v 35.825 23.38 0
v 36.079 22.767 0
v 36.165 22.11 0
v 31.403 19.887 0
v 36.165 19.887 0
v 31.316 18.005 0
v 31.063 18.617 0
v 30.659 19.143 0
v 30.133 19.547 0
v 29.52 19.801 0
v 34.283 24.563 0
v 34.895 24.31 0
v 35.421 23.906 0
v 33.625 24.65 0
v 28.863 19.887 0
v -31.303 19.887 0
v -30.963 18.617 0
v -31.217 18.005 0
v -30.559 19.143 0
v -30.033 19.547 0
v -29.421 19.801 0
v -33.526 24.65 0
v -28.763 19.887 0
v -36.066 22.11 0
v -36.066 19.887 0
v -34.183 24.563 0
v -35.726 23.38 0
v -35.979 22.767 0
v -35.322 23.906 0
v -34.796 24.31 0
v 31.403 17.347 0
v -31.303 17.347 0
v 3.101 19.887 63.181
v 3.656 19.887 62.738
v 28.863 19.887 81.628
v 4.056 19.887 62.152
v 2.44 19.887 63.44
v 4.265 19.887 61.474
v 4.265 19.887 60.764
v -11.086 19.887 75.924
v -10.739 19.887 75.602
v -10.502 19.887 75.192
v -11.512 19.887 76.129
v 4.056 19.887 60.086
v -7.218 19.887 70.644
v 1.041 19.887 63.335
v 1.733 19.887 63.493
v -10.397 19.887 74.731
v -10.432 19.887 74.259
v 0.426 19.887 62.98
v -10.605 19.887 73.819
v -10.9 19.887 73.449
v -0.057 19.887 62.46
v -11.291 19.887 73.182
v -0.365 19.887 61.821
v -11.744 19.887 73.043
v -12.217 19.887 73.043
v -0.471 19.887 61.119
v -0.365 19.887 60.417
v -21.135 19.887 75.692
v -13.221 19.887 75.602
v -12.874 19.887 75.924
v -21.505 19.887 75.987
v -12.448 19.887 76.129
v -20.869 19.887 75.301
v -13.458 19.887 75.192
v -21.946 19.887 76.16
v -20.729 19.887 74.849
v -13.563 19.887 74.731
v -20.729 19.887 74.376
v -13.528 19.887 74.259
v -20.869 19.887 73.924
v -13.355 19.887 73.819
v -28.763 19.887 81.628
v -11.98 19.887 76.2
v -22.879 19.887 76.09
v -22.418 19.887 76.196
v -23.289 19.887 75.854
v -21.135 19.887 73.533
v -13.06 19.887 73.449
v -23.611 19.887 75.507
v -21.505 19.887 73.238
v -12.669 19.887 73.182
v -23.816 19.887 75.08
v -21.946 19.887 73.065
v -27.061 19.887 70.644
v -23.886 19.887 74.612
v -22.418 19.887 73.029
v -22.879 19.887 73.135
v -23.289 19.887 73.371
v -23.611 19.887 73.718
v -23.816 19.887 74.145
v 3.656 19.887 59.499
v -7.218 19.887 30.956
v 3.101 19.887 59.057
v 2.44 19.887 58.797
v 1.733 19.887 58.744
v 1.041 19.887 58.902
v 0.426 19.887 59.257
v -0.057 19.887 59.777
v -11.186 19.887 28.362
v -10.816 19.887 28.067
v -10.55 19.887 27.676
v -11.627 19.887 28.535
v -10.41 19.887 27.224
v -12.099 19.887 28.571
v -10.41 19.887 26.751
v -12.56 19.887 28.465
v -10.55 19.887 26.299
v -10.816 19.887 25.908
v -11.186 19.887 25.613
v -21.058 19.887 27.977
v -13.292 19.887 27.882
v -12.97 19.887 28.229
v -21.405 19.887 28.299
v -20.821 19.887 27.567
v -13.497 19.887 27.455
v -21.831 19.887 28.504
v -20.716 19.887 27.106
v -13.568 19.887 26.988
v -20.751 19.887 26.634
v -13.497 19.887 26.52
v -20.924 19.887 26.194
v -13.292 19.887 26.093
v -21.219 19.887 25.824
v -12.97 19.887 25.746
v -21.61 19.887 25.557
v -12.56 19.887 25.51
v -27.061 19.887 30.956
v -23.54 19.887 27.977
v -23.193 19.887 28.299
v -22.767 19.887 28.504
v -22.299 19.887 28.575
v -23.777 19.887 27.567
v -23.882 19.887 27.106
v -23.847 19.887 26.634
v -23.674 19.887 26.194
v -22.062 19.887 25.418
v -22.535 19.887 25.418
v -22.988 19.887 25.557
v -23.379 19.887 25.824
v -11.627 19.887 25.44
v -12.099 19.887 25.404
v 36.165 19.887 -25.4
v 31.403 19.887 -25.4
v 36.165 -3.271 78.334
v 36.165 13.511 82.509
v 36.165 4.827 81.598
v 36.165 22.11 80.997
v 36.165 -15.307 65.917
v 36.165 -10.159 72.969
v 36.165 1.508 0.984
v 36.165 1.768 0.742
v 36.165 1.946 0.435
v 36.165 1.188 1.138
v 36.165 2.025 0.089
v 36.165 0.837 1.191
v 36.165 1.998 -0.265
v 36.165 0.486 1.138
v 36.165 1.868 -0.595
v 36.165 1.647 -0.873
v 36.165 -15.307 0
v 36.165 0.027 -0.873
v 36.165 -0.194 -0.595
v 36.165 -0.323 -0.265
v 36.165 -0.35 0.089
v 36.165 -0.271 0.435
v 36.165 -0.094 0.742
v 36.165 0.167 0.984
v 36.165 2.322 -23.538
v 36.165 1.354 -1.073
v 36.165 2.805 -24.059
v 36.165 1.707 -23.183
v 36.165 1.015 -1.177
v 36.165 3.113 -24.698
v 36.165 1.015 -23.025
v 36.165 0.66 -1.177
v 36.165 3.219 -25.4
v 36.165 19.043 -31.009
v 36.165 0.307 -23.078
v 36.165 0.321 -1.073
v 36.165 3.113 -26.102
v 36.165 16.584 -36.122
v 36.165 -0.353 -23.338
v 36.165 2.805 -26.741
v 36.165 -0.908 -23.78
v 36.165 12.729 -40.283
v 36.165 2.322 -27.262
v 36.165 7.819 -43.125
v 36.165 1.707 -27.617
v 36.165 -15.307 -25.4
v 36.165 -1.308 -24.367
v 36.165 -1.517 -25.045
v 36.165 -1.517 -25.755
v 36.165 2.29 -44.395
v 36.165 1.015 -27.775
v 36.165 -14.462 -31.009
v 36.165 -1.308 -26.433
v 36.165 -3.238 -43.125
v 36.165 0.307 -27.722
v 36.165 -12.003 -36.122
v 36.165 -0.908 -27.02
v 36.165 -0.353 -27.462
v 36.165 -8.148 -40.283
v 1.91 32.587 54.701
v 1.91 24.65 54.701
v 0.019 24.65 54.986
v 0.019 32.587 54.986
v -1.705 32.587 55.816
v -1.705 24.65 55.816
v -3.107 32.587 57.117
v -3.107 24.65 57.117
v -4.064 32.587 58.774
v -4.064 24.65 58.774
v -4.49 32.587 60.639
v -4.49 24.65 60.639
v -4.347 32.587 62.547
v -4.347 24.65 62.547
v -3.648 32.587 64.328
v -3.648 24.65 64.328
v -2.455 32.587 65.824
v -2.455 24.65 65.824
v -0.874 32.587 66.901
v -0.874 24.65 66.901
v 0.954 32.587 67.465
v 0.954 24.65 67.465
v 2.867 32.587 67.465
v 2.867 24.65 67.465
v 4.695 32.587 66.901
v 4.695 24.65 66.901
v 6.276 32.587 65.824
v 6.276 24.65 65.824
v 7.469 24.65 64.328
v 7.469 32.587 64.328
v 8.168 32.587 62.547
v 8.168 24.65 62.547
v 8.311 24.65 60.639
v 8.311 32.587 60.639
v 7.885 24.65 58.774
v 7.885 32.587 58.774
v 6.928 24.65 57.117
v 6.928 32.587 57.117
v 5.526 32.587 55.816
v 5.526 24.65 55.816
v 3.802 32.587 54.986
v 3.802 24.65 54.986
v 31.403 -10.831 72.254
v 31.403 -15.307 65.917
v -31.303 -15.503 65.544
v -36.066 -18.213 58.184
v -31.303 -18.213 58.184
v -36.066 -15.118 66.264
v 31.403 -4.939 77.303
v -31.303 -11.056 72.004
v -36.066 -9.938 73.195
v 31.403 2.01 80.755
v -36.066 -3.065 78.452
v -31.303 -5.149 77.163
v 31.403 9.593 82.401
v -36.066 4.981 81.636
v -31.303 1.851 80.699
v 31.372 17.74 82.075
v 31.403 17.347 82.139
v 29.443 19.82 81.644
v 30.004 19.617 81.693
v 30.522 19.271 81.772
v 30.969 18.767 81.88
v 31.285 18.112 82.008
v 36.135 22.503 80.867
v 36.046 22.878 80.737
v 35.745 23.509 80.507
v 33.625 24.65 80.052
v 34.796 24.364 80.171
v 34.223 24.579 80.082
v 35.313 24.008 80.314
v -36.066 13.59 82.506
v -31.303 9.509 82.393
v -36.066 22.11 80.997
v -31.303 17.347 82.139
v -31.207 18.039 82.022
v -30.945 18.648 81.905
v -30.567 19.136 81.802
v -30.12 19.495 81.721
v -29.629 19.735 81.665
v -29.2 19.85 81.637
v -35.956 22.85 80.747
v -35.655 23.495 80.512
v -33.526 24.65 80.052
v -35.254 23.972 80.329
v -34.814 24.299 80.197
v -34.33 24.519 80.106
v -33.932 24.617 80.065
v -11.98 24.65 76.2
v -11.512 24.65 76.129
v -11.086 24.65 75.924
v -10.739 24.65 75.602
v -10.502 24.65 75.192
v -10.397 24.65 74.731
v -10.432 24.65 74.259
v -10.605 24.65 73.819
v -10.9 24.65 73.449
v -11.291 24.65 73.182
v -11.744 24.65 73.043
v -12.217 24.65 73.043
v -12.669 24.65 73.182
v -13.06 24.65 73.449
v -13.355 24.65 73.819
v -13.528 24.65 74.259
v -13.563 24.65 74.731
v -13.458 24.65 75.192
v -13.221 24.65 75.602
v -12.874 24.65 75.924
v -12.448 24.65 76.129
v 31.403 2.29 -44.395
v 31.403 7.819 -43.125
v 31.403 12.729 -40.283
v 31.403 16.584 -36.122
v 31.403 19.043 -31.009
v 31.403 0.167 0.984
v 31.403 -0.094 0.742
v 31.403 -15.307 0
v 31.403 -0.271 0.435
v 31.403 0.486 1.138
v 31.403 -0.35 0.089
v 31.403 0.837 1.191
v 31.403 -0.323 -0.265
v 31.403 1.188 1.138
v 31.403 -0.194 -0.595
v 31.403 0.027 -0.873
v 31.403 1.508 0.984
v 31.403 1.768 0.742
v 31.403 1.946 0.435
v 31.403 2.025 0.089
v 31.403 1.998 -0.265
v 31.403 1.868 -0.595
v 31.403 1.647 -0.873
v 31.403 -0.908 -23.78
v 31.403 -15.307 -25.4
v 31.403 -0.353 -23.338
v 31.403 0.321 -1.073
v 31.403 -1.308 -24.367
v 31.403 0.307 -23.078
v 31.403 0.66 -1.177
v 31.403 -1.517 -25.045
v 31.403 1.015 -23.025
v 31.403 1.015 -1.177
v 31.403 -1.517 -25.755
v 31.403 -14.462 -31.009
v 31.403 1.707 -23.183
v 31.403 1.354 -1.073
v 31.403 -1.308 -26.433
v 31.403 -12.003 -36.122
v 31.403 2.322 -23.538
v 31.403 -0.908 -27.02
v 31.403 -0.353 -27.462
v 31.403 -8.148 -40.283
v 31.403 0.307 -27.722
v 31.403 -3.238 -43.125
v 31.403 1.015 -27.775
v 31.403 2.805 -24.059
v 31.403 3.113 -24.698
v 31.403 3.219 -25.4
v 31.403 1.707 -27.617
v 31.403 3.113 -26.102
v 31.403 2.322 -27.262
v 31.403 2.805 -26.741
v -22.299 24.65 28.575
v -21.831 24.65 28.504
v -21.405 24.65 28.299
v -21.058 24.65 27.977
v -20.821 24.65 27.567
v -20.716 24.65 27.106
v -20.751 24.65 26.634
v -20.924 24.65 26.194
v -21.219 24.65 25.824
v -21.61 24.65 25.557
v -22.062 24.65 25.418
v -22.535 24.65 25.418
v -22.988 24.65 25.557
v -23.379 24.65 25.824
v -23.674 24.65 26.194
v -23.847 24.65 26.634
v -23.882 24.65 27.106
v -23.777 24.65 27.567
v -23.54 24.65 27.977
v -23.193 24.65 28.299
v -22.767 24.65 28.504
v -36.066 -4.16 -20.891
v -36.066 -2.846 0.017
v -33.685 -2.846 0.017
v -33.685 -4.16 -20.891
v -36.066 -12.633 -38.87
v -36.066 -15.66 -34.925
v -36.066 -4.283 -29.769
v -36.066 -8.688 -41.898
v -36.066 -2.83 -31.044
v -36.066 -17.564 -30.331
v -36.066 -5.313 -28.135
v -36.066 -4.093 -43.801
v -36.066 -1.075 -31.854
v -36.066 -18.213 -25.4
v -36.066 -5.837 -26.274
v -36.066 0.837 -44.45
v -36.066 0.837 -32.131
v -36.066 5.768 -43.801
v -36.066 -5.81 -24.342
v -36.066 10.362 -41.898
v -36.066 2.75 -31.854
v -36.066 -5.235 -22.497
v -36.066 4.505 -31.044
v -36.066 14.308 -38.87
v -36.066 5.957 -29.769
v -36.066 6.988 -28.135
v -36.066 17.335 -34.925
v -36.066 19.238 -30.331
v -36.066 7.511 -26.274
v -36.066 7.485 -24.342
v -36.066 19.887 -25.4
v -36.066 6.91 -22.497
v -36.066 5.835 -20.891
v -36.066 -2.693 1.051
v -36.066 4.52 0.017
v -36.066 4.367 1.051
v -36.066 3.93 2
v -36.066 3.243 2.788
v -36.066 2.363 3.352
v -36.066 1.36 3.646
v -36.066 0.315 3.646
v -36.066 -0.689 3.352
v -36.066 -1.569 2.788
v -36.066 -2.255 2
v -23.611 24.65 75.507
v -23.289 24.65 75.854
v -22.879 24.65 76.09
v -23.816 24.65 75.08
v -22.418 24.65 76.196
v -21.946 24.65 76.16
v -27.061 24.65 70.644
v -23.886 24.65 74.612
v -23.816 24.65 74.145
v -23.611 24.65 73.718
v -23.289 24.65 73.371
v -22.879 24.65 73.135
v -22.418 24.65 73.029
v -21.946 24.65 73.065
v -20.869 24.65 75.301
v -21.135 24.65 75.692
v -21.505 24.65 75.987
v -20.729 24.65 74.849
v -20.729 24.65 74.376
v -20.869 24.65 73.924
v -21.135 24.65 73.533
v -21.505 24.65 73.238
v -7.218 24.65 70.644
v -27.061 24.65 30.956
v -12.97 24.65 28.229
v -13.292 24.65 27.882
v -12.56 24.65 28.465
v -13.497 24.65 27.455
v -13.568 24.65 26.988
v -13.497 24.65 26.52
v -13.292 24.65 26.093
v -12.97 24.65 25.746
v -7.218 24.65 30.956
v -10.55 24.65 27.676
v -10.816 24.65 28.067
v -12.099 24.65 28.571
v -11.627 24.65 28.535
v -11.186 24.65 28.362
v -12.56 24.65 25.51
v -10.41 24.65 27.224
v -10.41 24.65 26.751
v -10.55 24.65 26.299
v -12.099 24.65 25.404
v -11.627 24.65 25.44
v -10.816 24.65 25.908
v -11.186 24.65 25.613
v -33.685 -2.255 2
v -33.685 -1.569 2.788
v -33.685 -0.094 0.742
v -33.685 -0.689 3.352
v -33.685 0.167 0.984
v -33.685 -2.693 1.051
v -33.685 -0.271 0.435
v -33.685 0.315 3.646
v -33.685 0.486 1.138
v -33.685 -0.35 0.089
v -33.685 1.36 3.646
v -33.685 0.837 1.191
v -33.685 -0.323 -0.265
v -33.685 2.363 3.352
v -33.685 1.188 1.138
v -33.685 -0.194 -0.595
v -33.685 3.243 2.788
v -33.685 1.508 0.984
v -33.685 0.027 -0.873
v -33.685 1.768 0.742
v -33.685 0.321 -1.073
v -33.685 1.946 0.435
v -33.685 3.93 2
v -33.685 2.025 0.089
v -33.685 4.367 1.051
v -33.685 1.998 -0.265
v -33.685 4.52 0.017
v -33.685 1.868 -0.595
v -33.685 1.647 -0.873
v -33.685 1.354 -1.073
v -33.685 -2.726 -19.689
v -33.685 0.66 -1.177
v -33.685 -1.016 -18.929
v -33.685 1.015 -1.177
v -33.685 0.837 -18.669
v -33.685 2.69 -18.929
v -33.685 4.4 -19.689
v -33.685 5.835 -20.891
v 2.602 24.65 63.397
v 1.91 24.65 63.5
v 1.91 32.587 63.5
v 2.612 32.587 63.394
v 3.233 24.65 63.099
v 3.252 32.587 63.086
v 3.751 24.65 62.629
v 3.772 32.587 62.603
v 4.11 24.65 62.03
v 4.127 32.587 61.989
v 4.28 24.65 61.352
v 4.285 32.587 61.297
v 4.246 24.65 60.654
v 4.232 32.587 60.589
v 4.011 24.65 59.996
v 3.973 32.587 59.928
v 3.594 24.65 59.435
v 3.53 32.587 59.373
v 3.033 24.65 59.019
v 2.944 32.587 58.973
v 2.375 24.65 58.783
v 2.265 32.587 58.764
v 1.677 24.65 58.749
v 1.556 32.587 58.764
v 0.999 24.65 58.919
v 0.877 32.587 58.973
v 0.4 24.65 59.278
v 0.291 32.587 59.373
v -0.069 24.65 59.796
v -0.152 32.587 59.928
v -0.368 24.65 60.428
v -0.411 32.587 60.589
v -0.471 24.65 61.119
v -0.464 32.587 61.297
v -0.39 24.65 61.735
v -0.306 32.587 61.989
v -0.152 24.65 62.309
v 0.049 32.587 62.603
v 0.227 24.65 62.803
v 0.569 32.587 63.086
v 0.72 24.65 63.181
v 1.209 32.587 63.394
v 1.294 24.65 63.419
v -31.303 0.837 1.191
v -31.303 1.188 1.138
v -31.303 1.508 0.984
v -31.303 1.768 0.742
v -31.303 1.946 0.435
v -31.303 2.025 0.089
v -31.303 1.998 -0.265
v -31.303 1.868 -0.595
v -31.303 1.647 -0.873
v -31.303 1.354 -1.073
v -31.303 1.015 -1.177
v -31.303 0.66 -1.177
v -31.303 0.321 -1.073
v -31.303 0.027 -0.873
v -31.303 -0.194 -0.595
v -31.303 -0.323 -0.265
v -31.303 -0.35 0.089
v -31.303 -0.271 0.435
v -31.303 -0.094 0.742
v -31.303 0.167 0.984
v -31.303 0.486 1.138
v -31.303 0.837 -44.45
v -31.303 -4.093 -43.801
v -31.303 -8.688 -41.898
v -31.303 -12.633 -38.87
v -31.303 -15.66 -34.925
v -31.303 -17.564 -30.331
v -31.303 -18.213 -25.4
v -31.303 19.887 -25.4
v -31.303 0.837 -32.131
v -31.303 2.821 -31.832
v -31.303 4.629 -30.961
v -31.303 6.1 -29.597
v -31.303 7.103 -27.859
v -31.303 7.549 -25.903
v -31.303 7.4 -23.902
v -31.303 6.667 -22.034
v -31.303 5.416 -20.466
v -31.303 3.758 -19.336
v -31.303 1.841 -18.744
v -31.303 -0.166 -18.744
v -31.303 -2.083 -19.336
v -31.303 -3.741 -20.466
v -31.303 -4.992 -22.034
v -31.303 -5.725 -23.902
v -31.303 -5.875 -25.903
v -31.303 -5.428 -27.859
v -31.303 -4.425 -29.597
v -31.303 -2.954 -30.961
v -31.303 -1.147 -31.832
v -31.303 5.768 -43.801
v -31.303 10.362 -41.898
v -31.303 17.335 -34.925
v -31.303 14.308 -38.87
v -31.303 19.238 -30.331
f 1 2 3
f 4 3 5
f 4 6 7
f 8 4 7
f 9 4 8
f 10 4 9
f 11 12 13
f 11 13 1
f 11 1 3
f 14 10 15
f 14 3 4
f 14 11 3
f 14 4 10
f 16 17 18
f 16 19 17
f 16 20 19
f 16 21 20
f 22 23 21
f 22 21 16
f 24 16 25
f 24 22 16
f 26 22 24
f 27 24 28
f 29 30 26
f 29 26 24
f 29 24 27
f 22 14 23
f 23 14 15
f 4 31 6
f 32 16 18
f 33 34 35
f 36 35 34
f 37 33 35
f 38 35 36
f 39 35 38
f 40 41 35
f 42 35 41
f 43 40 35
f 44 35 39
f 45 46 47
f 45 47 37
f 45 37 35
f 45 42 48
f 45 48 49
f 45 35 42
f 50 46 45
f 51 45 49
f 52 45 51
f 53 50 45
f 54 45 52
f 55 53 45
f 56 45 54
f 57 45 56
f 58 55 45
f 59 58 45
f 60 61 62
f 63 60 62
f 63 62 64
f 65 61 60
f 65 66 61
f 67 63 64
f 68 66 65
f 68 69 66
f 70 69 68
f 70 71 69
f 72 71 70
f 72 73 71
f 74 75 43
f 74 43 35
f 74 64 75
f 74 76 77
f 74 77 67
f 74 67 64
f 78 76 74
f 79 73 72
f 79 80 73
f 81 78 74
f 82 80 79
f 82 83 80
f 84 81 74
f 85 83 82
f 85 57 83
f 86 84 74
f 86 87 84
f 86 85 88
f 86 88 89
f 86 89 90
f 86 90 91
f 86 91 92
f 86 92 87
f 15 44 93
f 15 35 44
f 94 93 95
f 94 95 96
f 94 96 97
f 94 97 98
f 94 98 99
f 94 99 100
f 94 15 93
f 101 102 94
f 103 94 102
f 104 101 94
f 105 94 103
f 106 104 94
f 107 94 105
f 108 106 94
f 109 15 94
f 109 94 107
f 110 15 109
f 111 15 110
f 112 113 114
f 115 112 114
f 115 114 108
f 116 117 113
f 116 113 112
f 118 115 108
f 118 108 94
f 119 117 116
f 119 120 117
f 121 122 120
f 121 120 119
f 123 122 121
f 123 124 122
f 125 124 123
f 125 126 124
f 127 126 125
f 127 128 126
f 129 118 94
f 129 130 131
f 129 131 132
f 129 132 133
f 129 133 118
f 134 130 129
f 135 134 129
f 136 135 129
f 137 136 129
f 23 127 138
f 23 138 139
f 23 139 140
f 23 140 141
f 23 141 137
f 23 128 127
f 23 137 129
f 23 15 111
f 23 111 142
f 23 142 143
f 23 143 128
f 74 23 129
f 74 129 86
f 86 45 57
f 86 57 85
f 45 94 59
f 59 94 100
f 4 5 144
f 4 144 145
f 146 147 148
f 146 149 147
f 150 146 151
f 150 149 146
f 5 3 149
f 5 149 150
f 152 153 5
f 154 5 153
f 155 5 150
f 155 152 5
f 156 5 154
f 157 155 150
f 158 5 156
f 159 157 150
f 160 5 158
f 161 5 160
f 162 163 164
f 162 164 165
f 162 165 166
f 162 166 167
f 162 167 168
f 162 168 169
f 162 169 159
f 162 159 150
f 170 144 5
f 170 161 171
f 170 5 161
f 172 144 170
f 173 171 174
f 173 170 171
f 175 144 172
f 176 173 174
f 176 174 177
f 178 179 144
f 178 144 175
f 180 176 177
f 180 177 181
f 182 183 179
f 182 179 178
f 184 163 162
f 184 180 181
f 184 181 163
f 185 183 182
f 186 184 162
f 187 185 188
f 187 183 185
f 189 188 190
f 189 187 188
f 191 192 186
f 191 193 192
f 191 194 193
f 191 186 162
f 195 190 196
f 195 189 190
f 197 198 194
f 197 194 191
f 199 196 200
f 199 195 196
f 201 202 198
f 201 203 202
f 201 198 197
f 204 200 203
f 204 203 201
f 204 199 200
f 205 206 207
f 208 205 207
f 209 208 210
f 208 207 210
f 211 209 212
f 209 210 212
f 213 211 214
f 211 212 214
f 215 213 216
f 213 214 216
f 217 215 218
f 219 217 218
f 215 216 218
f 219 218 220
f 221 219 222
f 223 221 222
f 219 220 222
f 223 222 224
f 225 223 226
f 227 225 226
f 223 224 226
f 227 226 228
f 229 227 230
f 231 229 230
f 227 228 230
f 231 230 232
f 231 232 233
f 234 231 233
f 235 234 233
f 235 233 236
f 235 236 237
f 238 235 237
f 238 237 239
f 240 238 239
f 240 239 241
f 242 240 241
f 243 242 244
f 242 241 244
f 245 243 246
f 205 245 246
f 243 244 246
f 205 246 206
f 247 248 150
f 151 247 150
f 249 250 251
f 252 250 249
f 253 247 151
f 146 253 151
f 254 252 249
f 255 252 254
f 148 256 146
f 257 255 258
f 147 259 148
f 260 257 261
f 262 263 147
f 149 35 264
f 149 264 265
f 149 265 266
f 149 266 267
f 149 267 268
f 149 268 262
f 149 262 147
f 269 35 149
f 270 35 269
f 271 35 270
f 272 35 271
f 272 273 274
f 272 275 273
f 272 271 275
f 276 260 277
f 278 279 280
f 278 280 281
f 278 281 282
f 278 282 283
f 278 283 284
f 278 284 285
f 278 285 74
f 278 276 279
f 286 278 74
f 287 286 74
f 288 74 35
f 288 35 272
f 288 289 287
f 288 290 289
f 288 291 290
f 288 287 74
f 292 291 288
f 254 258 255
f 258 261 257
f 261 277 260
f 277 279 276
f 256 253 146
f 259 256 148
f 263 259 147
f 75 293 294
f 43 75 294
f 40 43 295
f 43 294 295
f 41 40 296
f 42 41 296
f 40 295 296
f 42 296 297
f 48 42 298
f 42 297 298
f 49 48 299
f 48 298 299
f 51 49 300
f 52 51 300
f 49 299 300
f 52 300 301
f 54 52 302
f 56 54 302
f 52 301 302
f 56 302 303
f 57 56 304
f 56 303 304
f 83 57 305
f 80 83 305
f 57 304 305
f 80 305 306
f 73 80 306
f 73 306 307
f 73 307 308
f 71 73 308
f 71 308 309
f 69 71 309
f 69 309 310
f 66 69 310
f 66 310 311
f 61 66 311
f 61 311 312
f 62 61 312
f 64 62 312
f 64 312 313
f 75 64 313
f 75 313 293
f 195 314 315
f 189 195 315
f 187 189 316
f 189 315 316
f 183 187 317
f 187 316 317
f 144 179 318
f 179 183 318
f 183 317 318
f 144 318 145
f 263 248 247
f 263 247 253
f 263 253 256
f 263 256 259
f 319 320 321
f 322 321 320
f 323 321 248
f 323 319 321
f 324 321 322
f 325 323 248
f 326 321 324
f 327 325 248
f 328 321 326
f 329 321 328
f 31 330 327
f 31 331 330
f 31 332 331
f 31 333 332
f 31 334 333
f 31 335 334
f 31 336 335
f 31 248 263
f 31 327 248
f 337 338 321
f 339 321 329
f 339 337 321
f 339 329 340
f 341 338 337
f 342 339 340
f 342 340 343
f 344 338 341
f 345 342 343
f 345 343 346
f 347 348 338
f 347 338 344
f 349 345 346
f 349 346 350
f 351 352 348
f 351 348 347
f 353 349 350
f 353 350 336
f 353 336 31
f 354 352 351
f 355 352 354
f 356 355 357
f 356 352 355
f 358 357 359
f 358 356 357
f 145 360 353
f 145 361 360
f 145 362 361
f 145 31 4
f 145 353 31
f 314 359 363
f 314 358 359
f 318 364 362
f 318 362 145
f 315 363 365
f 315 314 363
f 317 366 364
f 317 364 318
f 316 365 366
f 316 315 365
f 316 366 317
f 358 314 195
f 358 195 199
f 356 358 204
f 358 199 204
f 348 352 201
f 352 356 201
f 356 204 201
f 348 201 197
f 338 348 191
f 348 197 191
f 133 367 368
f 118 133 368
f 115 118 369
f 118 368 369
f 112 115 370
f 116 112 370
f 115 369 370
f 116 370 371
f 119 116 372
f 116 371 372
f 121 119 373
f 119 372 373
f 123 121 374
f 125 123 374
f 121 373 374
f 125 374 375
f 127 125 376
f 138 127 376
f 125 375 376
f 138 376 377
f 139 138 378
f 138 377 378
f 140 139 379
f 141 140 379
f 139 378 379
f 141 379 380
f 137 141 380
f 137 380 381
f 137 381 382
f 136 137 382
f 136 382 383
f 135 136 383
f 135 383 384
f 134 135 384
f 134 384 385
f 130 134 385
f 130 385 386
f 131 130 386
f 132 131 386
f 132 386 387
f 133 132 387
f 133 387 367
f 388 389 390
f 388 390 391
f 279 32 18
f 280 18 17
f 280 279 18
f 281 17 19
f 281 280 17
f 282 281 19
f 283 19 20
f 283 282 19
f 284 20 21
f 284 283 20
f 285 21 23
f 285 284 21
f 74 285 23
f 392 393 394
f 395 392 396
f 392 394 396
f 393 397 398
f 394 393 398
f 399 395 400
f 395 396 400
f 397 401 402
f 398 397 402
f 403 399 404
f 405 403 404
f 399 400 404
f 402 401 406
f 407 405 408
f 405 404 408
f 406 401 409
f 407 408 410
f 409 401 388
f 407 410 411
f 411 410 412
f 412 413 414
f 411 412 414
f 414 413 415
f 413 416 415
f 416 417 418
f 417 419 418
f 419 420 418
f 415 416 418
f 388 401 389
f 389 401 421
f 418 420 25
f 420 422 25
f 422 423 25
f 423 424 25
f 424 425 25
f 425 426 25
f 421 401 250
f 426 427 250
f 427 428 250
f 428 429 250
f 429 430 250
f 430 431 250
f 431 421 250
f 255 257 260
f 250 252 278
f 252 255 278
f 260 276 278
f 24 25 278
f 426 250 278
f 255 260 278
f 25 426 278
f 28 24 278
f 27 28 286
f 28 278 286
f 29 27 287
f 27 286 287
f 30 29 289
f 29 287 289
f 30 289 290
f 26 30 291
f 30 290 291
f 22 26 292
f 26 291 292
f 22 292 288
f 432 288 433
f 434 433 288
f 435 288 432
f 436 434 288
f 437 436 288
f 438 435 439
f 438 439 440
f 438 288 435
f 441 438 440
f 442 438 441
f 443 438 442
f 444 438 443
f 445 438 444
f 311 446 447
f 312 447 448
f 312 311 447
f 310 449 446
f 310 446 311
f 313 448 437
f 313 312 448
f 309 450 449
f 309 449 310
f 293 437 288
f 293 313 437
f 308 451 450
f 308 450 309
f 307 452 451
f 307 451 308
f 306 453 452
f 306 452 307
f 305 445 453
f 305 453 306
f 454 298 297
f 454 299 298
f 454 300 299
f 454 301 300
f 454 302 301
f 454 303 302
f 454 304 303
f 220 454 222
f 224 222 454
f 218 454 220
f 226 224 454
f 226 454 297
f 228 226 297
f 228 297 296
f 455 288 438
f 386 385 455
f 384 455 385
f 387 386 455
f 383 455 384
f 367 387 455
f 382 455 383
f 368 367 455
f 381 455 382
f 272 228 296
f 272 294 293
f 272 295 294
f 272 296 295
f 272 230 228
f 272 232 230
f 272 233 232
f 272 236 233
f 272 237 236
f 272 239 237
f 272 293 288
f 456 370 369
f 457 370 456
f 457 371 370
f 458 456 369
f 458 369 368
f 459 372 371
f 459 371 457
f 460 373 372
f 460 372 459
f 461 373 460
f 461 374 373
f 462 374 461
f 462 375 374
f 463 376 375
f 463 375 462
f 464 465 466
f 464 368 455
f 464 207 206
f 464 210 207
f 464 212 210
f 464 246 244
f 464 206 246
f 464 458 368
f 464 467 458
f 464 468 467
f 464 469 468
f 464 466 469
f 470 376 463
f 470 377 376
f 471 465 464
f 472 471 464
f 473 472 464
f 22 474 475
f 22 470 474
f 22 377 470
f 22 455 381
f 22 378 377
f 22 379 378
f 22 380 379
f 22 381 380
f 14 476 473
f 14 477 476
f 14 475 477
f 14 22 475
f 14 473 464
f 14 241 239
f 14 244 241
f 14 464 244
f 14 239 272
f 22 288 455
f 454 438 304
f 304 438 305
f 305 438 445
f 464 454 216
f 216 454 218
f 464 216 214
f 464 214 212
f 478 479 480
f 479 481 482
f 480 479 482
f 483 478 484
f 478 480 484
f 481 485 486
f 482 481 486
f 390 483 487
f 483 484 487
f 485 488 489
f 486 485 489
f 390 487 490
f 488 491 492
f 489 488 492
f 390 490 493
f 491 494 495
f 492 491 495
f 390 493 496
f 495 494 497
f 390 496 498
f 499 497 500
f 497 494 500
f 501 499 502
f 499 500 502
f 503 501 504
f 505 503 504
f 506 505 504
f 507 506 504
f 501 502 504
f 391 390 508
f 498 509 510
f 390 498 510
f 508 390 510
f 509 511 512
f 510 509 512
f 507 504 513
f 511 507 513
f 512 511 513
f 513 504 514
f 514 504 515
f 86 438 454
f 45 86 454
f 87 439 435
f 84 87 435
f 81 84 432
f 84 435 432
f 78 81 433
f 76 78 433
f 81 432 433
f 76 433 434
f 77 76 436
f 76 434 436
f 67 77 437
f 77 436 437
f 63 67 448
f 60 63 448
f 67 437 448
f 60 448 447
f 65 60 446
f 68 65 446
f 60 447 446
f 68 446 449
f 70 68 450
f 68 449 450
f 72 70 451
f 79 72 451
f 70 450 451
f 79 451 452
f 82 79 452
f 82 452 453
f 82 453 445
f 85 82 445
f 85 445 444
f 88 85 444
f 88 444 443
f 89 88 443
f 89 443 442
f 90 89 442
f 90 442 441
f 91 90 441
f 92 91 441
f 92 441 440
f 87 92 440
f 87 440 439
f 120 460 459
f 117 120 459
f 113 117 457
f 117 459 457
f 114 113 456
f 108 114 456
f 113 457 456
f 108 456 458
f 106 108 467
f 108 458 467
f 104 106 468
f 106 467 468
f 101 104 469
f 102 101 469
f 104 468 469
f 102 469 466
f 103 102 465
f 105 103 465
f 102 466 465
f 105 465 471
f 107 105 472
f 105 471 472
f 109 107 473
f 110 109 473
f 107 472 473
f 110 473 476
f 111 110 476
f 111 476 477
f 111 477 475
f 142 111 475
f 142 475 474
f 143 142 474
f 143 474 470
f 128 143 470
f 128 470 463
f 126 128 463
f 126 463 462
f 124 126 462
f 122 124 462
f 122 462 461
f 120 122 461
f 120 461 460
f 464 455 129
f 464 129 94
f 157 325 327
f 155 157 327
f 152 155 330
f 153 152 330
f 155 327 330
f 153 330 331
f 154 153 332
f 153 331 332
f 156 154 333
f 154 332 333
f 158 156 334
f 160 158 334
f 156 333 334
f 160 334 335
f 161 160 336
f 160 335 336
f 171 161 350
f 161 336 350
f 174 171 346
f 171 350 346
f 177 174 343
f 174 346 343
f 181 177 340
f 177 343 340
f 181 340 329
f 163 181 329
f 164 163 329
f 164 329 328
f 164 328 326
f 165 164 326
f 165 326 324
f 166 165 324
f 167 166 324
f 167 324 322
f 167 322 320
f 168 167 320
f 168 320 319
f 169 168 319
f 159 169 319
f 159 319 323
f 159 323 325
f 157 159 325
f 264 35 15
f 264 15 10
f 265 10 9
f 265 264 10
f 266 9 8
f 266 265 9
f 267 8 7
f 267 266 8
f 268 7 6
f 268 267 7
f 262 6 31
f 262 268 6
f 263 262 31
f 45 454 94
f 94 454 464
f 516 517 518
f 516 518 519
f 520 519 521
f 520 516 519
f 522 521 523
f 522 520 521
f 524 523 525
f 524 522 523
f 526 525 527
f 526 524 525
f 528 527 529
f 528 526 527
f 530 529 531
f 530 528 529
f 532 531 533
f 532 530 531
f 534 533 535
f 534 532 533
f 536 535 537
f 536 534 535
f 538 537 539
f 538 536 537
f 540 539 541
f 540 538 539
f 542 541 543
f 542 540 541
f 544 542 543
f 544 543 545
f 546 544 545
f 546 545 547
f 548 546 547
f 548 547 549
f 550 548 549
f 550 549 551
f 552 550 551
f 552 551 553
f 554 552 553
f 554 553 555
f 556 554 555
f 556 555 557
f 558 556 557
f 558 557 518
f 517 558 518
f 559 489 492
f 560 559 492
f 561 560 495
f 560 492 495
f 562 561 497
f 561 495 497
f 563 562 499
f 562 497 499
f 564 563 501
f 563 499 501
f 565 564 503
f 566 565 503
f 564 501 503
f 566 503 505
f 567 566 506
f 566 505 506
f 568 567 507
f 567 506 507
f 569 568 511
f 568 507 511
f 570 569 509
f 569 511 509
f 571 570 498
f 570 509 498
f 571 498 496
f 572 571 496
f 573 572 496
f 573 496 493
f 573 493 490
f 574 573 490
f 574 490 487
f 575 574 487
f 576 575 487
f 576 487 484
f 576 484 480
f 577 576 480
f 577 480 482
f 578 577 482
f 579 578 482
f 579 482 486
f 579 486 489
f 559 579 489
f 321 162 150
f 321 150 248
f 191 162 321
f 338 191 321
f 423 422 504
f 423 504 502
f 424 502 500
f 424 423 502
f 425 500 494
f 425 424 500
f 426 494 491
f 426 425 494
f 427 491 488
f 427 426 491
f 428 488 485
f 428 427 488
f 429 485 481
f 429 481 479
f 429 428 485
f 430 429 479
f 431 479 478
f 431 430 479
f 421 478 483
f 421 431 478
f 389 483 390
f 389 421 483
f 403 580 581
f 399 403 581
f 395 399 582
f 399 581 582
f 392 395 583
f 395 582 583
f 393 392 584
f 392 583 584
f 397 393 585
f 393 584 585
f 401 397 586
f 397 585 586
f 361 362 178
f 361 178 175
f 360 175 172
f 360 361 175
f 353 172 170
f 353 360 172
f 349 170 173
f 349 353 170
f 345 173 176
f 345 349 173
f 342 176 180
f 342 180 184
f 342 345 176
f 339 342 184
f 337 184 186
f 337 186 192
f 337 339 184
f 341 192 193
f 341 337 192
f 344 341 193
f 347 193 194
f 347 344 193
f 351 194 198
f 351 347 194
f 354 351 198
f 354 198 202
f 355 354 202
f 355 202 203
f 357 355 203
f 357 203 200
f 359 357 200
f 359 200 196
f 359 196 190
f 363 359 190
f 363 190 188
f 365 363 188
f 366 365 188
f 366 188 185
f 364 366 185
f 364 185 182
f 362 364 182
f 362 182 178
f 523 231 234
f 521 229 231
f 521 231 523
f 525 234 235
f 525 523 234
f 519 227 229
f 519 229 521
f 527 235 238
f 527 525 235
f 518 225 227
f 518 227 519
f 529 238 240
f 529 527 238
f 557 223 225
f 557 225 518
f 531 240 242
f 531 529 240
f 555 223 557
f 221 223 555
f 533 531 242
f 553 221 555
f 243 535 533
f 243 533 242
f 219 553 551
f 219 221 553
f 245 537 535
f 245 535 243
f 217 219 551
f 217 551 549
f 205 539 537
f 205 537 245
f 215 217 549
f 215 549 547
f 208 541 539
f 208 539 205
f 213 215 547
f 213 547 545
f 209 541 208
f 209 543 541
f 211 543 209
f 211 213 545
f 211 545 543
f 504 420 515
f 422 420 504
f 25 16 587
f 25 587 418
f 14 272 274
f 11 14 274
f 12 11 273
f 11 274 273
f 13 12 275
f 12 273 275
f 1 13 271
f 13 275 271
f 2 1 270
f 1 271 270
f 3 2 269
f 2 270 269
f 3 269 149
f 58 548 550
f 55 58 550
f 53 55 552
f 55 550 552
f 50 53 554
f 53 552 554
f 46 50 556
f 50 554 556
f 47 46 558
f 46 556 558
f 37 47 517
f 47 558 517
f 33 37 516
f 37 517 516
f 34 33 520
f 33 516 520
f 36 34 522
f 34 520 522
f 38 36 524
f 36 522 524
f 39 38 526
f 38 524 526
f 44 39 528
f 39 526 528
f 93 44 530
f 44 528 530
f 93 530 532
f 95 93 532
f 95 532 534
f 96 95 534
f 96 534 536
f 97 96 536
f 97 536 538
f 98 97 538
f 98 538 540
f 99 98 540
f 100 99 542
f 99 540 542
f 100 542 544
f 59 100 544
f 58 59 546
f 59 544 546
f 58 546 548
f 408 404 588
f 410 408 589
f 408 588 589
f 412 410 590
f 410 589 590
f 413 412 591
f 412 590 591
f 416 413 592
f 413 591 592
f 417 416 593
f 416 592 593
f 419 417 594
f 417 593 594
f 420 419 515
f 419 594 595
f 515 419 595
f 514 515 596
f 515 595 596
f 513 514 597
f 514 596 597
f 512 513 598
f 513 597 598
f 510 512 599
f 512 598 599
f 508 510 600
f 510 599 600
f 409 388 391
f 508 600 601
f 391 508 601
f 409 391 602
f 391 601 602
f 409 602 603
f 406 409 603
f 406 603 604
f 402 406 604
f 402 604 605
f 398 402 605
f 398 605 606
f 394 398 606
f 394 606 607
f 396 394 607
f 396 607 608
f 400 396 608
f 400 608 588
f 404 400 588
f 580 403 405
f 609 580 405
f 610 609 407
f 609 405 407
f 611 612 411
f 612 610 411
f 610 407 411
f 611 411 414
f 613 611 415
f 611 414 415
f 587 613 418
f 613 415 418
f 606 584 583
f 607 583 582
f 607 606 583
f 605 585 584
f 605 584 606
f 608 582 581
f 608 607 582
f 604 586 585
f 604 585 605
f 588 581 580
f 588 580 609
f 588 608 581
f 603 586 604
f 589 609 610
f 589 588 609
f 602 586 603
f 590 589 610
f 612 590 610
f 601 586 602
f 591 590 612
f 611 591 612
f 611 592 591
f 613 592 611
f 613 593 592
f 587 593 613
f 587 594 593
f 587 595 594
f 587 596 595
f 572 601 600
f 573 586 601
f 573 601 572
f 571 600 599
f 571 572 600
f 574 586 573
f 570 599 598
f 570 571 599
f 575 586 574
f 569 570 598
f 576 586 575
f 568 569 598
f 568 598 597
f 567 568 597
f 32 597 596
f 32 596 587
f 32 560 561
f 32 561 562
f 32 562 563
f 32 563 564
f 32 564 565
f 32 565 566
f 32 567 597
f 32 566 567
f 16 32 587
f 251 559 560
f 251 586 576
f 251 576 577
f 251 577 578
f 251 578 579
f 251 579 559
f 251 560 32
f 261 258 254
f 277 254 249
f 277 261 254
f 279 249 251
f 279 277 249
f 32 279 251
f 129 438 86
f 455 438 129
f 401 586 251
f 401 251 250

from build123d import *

# Parameters (mm, degrees)
BOSS_EXTRUDE1_DEPTH = 101.6
SKETCH2_W           = 4.7625
SKETCH2_H           = 38.1
SKETCH2_H_2         = 35.194001629
BOSS_EXTRUDE2_DEPTH = 44.45
FILLET1_R           = 19.05
FILLET4_R           = 2.54
FILLET5_R           = 2.54
SKETCH4_R           = 1.190625
CUT_EXTRUDE1_DEPTH  = 128.07291971
SKETCH5_R           = 1.5875
SKETCH5_W           = 19.84375
SKETCH5_H           = 39.6875
CUT_EXTRUDE2_DEPTH  = 117.05035969
SKETCH6_R           = 6.418083015
SKETCH6_R_2         = 2.38125
BOSS_EXTRUDE3_DEPTH = 7.9375
SKETCH7_R           = 2.38125
CUT_EXTRUDE3_DEPTH  = 117.05035969
CUT_EXTRUDE4_START  = -12.7
SKETCH8_R           = 1.190625
SKETCH8_R_2         = 2.38125
CUT_EXTRUDE4_DEPTH  = 12.7
CUT_EXTRUDE5_DEPTH  = 2.38125
SKETCH10_R          = 6.731
CUT_EXTRUDE6_DEPTH  = 127.239951738
CUT_EXTRUDE7_DEPTH  = 129.848153517


with BuildPart() as part:
    # Sketch1 → Boss-Extrude1 (new body)
    with BuildSketch(Plane.XY):
        Polygon((-36.065906398, 24.64981637), (36.165343602, 24.64981637), (36.165343602, -15.306685259), (31.402843602, -15.306685259), (31.402843602, 19.88731637), (-31.303406398, 19.88731637), (-31.303406398, -18.21268363), (-36.065906398, -18.21268363), align=None)
    extrude(amount=BOSS_EXTRUDE1_DEPTH)

    # Sketch2 → Boss-Extrude2 (add)
    with BuildSketch(Plane(origin=(0, 0, 0), x_dir=(-1, 0, 0), z_dir=(0, 0, -1))):
        with Locations((33.684656398, 0.83731637)):
            Rectangle(SKETCH2_W, SKETCH2_H)
        with Locations((-33.784093602, 2.290315555)):
            Rectangle(SKETCH2_W, SKETCH2_H_2)
    extrude(amount=BOSS_EXTRUDE2_DEPTH)

    # Fillet1
    # the kernel refuses this fillet: 19.05 mm, written as the material it takes off along each edge
    with BuildSketch(Plane(origin=(16.321593602, -18.21268363, -44.45), x_dir=(0, 0, 1), z_dir=(-1, 0, 0))) as fillet1_piece_1:
        with BuildLine():
            CenterArc((FILLET1_R, FILLET1_R), FILLET1_R, 180, 90)
            Line((0, FILLET1_R), (0, 0))
            Line((0, 0), (FILLET1_R, 0))
        make_face()
    extrude(amount=100.0125, mode=Mode.SUBTRACT)
    with BuildSketch(Plane(origin=(-83.690906398, 19.88731637, -44.45), x_dir=(0, -1, 0), z_dir=(1, 0, 0)), Plane(origin=(83.790343602, -15.306685259, -44.45), x_dir=(0, 1, 0), z_dir=(-1, 0, 0)), Plane(origin=(-16.222156398, 19.88731637, -44.45), x_dir=(0, -1, 0), z_dir=(1, 0, 0))) as fillet1_piece_2:
        with BuildLine():
            CenterArc((FILLET1_R, -FILLET1_R), FILLET1_R, 90, 90)
            Line((0, -FILLET1_R), (0, 0))
            Line((0, 0), (FILLET1_R, 0))
        make_face()
    extrude(amount=100.0125, mode=Mode.SUBTRACT)

    # Fillet4
    fillet4_edges = [part.edges().sort_by_distance(p)[0] for p in [
        (-36.065906398, 24.64981637, 50.8),
        (36.165343602, 24.64981637, 50.8),
        (31.402843602, 19.88731637, 50.8),
        (-31.303406398, 19.88731637, 50.8),
    ]]
    fillet(fillet4_edges, radius=FILLET4_R)

    # Fillet5
    fillet5_edges = [part.edges().sort_by_distance(p)[0] for p in [
        (33.784093602, -15.306685259, 101.6),
        (-33.684656398, -18.21268363, 101.6),
    ]]
    fillet(fillet5_edges, radius=FILLET5_R)

    # Sketch4 → Cut-Extrude1 (cut, through all)
    with BuildSketch(Plane.ZY.offset(36.065906398)):
        with Locations((-25.4, 0.83731637)):
            Circle(SKETCH4_R)
        with Locations((0, 0.83731637)):
            Circle(SKETCH4_R)
    extrude(amount=-CUT_EXTRUDE1_DEPTH, mode=Mode.SUBTRACT)

    # Sketch5 → Cut-Extrude2 (cut, through all)
    with BuildSketch(Plane(origin=(0, 24.64981637, 0), x_dir=(1, 0, 0), z_dir=(0, 1, 0))):
        with Locations(Location((-22.298893396, -26.9875, 0), (0, 0, 270))):
            Circle(SKETCH5_R)
        with Locations(Location((-11.980143396, -26.9875, 0), (0, 0, 180))):
            Circle(SKETCH5_R)
        with Locations(Location((-11.980143396, -74.6125, 0), (0, 0, 270))):
            Circle(SKETCH5_R)
        with Locations(Location((-22.298893396, -74.6125, 0), (0, 0, 180))):
            Circle(SKETCH5_R)
        with Locations((-17.139518396, -50.8)):
            Rectangle(SKETCH5_W, SKETCH5_H)
    extrude(amount=-CUT_EXTRUDE2_DEPTH, mode=Mode.SUBTRACT)

    # Sketch6 → Boss-Extrude3 (add)
    with BuildSketch(Plane(origin=(0, 24.64981637, 0), x_dir=(1, 0, 0), z_dir=(0, 1, 0))):
        with Locations(Location((1.910481604, -61.11875, 0), (0, 0, 90))):
            Circle(SKETCH6_R)
        with Locations(Location((1.910481604, -61.11875, 0), (0, 0, 270))):
            Circle(SKETCH6_R_2, mode=Mode.SUBTRACT)
    extrude(amount=BOSS_EXTRUDE3_DEPTH)

    # Sketch7 → Cut-Extrude3 (cut, through all)
    with BuildSketch(Plane(origin=(0, 24.64981637, 0), x_dir=(1, 0, 0), z_dir=(0, 1, 0))):
        with Locations(Location((1.910481604, -61.11875, 0), (0, 0, 180))):
            Circle(SKETCH7_R)
    extrude(amount=-CUT_EXTRUDE3_DEPTH, mode=Mode.SUBTRACT)

    # Sketch8 → Cut-Extrude4 (cut)
    with BuildSketch(Plane(origin=(36.165343602, 0, 0), x_dir=(0, 0, -1), z_dir=(1, 0, 0)).offset(CUT_EXTRUDE4_START)):
        with Locations(Location((0, 0.83731637, 0), (0, 0, 180))):
            Circle(SKETCH8_R)
        with Locations(Location((25.4, 0.83731637, 0), (0, 0, 90))):
            Circle(SKETCH8_R_2)
    extrude(amount=CUT_EXTRUDE4_DEPTH, mode=Mode.SUBTRACT)

    # Sketch9 → Cut-Extrude5 (cut)
    with BuildSketch(Plane.ZY.offset(36.065906398)):
        with BuildLine():
            Line((-25.069295566, 6.097430896), (0.016544331, 4.520279211))
            ThreePointArc((0.016544331, 4.520279211), (3.683, 0.83731637), (0.016544331, -2.84564647))
            Line((0.016544331, -2.84564647), (-25.069295566, -4.422798156))
            ThreePointArc((-25.069295566, -4.422798156), (-30.6705, 0.83731637), (-25.069295566, 6.097430896))
        make_face()
    extrude(amount=-CUT_EXTRUDE5_DEPTH, mode=Mode.SUBTRACT)

    # Sketch10 → Cut-Extrude6 (cut, through all)
    with BuildSketch(Plane(origin=(-31.303406398, 0, 0), x_dir=(0, 0, -1), z_dir=(1, 0, 0))):
        with Locations((25.4, 0.83731637)):
            Circle(SKETCH10_R)
    extrude(amount=-CUT_EXTRUDE6_DEPTH, mode=Mode.SUBTRACT)

    # Sketch11 → Cut-Extrude7 (cut, through all)
    with BuildSketch(Plane.ZY.offset(36.065906398)):
        with BuildLine():
            Line((78.230942549, 28.285686863), (107.145035189, 28.285686863))
            Line((107.145035189, 28.285686863), (107.145035189, -25.578978537))
            Line((107.145035189, -25.578978537), (47.434592149, -25.578978537))
            Line((47.434592149, -25.578978537), (47.434592149, -18.811963789))
            ThreePointArc((47.434592149, -18.811963789), (77.401439504, -4.789344682), (78.230942549, 28.285686863))
        make_face()
    extrude(amount=-CUT_EXTRUDE7_DEPTH, mode=Mode.SUBTRACT)


solid = part.part
